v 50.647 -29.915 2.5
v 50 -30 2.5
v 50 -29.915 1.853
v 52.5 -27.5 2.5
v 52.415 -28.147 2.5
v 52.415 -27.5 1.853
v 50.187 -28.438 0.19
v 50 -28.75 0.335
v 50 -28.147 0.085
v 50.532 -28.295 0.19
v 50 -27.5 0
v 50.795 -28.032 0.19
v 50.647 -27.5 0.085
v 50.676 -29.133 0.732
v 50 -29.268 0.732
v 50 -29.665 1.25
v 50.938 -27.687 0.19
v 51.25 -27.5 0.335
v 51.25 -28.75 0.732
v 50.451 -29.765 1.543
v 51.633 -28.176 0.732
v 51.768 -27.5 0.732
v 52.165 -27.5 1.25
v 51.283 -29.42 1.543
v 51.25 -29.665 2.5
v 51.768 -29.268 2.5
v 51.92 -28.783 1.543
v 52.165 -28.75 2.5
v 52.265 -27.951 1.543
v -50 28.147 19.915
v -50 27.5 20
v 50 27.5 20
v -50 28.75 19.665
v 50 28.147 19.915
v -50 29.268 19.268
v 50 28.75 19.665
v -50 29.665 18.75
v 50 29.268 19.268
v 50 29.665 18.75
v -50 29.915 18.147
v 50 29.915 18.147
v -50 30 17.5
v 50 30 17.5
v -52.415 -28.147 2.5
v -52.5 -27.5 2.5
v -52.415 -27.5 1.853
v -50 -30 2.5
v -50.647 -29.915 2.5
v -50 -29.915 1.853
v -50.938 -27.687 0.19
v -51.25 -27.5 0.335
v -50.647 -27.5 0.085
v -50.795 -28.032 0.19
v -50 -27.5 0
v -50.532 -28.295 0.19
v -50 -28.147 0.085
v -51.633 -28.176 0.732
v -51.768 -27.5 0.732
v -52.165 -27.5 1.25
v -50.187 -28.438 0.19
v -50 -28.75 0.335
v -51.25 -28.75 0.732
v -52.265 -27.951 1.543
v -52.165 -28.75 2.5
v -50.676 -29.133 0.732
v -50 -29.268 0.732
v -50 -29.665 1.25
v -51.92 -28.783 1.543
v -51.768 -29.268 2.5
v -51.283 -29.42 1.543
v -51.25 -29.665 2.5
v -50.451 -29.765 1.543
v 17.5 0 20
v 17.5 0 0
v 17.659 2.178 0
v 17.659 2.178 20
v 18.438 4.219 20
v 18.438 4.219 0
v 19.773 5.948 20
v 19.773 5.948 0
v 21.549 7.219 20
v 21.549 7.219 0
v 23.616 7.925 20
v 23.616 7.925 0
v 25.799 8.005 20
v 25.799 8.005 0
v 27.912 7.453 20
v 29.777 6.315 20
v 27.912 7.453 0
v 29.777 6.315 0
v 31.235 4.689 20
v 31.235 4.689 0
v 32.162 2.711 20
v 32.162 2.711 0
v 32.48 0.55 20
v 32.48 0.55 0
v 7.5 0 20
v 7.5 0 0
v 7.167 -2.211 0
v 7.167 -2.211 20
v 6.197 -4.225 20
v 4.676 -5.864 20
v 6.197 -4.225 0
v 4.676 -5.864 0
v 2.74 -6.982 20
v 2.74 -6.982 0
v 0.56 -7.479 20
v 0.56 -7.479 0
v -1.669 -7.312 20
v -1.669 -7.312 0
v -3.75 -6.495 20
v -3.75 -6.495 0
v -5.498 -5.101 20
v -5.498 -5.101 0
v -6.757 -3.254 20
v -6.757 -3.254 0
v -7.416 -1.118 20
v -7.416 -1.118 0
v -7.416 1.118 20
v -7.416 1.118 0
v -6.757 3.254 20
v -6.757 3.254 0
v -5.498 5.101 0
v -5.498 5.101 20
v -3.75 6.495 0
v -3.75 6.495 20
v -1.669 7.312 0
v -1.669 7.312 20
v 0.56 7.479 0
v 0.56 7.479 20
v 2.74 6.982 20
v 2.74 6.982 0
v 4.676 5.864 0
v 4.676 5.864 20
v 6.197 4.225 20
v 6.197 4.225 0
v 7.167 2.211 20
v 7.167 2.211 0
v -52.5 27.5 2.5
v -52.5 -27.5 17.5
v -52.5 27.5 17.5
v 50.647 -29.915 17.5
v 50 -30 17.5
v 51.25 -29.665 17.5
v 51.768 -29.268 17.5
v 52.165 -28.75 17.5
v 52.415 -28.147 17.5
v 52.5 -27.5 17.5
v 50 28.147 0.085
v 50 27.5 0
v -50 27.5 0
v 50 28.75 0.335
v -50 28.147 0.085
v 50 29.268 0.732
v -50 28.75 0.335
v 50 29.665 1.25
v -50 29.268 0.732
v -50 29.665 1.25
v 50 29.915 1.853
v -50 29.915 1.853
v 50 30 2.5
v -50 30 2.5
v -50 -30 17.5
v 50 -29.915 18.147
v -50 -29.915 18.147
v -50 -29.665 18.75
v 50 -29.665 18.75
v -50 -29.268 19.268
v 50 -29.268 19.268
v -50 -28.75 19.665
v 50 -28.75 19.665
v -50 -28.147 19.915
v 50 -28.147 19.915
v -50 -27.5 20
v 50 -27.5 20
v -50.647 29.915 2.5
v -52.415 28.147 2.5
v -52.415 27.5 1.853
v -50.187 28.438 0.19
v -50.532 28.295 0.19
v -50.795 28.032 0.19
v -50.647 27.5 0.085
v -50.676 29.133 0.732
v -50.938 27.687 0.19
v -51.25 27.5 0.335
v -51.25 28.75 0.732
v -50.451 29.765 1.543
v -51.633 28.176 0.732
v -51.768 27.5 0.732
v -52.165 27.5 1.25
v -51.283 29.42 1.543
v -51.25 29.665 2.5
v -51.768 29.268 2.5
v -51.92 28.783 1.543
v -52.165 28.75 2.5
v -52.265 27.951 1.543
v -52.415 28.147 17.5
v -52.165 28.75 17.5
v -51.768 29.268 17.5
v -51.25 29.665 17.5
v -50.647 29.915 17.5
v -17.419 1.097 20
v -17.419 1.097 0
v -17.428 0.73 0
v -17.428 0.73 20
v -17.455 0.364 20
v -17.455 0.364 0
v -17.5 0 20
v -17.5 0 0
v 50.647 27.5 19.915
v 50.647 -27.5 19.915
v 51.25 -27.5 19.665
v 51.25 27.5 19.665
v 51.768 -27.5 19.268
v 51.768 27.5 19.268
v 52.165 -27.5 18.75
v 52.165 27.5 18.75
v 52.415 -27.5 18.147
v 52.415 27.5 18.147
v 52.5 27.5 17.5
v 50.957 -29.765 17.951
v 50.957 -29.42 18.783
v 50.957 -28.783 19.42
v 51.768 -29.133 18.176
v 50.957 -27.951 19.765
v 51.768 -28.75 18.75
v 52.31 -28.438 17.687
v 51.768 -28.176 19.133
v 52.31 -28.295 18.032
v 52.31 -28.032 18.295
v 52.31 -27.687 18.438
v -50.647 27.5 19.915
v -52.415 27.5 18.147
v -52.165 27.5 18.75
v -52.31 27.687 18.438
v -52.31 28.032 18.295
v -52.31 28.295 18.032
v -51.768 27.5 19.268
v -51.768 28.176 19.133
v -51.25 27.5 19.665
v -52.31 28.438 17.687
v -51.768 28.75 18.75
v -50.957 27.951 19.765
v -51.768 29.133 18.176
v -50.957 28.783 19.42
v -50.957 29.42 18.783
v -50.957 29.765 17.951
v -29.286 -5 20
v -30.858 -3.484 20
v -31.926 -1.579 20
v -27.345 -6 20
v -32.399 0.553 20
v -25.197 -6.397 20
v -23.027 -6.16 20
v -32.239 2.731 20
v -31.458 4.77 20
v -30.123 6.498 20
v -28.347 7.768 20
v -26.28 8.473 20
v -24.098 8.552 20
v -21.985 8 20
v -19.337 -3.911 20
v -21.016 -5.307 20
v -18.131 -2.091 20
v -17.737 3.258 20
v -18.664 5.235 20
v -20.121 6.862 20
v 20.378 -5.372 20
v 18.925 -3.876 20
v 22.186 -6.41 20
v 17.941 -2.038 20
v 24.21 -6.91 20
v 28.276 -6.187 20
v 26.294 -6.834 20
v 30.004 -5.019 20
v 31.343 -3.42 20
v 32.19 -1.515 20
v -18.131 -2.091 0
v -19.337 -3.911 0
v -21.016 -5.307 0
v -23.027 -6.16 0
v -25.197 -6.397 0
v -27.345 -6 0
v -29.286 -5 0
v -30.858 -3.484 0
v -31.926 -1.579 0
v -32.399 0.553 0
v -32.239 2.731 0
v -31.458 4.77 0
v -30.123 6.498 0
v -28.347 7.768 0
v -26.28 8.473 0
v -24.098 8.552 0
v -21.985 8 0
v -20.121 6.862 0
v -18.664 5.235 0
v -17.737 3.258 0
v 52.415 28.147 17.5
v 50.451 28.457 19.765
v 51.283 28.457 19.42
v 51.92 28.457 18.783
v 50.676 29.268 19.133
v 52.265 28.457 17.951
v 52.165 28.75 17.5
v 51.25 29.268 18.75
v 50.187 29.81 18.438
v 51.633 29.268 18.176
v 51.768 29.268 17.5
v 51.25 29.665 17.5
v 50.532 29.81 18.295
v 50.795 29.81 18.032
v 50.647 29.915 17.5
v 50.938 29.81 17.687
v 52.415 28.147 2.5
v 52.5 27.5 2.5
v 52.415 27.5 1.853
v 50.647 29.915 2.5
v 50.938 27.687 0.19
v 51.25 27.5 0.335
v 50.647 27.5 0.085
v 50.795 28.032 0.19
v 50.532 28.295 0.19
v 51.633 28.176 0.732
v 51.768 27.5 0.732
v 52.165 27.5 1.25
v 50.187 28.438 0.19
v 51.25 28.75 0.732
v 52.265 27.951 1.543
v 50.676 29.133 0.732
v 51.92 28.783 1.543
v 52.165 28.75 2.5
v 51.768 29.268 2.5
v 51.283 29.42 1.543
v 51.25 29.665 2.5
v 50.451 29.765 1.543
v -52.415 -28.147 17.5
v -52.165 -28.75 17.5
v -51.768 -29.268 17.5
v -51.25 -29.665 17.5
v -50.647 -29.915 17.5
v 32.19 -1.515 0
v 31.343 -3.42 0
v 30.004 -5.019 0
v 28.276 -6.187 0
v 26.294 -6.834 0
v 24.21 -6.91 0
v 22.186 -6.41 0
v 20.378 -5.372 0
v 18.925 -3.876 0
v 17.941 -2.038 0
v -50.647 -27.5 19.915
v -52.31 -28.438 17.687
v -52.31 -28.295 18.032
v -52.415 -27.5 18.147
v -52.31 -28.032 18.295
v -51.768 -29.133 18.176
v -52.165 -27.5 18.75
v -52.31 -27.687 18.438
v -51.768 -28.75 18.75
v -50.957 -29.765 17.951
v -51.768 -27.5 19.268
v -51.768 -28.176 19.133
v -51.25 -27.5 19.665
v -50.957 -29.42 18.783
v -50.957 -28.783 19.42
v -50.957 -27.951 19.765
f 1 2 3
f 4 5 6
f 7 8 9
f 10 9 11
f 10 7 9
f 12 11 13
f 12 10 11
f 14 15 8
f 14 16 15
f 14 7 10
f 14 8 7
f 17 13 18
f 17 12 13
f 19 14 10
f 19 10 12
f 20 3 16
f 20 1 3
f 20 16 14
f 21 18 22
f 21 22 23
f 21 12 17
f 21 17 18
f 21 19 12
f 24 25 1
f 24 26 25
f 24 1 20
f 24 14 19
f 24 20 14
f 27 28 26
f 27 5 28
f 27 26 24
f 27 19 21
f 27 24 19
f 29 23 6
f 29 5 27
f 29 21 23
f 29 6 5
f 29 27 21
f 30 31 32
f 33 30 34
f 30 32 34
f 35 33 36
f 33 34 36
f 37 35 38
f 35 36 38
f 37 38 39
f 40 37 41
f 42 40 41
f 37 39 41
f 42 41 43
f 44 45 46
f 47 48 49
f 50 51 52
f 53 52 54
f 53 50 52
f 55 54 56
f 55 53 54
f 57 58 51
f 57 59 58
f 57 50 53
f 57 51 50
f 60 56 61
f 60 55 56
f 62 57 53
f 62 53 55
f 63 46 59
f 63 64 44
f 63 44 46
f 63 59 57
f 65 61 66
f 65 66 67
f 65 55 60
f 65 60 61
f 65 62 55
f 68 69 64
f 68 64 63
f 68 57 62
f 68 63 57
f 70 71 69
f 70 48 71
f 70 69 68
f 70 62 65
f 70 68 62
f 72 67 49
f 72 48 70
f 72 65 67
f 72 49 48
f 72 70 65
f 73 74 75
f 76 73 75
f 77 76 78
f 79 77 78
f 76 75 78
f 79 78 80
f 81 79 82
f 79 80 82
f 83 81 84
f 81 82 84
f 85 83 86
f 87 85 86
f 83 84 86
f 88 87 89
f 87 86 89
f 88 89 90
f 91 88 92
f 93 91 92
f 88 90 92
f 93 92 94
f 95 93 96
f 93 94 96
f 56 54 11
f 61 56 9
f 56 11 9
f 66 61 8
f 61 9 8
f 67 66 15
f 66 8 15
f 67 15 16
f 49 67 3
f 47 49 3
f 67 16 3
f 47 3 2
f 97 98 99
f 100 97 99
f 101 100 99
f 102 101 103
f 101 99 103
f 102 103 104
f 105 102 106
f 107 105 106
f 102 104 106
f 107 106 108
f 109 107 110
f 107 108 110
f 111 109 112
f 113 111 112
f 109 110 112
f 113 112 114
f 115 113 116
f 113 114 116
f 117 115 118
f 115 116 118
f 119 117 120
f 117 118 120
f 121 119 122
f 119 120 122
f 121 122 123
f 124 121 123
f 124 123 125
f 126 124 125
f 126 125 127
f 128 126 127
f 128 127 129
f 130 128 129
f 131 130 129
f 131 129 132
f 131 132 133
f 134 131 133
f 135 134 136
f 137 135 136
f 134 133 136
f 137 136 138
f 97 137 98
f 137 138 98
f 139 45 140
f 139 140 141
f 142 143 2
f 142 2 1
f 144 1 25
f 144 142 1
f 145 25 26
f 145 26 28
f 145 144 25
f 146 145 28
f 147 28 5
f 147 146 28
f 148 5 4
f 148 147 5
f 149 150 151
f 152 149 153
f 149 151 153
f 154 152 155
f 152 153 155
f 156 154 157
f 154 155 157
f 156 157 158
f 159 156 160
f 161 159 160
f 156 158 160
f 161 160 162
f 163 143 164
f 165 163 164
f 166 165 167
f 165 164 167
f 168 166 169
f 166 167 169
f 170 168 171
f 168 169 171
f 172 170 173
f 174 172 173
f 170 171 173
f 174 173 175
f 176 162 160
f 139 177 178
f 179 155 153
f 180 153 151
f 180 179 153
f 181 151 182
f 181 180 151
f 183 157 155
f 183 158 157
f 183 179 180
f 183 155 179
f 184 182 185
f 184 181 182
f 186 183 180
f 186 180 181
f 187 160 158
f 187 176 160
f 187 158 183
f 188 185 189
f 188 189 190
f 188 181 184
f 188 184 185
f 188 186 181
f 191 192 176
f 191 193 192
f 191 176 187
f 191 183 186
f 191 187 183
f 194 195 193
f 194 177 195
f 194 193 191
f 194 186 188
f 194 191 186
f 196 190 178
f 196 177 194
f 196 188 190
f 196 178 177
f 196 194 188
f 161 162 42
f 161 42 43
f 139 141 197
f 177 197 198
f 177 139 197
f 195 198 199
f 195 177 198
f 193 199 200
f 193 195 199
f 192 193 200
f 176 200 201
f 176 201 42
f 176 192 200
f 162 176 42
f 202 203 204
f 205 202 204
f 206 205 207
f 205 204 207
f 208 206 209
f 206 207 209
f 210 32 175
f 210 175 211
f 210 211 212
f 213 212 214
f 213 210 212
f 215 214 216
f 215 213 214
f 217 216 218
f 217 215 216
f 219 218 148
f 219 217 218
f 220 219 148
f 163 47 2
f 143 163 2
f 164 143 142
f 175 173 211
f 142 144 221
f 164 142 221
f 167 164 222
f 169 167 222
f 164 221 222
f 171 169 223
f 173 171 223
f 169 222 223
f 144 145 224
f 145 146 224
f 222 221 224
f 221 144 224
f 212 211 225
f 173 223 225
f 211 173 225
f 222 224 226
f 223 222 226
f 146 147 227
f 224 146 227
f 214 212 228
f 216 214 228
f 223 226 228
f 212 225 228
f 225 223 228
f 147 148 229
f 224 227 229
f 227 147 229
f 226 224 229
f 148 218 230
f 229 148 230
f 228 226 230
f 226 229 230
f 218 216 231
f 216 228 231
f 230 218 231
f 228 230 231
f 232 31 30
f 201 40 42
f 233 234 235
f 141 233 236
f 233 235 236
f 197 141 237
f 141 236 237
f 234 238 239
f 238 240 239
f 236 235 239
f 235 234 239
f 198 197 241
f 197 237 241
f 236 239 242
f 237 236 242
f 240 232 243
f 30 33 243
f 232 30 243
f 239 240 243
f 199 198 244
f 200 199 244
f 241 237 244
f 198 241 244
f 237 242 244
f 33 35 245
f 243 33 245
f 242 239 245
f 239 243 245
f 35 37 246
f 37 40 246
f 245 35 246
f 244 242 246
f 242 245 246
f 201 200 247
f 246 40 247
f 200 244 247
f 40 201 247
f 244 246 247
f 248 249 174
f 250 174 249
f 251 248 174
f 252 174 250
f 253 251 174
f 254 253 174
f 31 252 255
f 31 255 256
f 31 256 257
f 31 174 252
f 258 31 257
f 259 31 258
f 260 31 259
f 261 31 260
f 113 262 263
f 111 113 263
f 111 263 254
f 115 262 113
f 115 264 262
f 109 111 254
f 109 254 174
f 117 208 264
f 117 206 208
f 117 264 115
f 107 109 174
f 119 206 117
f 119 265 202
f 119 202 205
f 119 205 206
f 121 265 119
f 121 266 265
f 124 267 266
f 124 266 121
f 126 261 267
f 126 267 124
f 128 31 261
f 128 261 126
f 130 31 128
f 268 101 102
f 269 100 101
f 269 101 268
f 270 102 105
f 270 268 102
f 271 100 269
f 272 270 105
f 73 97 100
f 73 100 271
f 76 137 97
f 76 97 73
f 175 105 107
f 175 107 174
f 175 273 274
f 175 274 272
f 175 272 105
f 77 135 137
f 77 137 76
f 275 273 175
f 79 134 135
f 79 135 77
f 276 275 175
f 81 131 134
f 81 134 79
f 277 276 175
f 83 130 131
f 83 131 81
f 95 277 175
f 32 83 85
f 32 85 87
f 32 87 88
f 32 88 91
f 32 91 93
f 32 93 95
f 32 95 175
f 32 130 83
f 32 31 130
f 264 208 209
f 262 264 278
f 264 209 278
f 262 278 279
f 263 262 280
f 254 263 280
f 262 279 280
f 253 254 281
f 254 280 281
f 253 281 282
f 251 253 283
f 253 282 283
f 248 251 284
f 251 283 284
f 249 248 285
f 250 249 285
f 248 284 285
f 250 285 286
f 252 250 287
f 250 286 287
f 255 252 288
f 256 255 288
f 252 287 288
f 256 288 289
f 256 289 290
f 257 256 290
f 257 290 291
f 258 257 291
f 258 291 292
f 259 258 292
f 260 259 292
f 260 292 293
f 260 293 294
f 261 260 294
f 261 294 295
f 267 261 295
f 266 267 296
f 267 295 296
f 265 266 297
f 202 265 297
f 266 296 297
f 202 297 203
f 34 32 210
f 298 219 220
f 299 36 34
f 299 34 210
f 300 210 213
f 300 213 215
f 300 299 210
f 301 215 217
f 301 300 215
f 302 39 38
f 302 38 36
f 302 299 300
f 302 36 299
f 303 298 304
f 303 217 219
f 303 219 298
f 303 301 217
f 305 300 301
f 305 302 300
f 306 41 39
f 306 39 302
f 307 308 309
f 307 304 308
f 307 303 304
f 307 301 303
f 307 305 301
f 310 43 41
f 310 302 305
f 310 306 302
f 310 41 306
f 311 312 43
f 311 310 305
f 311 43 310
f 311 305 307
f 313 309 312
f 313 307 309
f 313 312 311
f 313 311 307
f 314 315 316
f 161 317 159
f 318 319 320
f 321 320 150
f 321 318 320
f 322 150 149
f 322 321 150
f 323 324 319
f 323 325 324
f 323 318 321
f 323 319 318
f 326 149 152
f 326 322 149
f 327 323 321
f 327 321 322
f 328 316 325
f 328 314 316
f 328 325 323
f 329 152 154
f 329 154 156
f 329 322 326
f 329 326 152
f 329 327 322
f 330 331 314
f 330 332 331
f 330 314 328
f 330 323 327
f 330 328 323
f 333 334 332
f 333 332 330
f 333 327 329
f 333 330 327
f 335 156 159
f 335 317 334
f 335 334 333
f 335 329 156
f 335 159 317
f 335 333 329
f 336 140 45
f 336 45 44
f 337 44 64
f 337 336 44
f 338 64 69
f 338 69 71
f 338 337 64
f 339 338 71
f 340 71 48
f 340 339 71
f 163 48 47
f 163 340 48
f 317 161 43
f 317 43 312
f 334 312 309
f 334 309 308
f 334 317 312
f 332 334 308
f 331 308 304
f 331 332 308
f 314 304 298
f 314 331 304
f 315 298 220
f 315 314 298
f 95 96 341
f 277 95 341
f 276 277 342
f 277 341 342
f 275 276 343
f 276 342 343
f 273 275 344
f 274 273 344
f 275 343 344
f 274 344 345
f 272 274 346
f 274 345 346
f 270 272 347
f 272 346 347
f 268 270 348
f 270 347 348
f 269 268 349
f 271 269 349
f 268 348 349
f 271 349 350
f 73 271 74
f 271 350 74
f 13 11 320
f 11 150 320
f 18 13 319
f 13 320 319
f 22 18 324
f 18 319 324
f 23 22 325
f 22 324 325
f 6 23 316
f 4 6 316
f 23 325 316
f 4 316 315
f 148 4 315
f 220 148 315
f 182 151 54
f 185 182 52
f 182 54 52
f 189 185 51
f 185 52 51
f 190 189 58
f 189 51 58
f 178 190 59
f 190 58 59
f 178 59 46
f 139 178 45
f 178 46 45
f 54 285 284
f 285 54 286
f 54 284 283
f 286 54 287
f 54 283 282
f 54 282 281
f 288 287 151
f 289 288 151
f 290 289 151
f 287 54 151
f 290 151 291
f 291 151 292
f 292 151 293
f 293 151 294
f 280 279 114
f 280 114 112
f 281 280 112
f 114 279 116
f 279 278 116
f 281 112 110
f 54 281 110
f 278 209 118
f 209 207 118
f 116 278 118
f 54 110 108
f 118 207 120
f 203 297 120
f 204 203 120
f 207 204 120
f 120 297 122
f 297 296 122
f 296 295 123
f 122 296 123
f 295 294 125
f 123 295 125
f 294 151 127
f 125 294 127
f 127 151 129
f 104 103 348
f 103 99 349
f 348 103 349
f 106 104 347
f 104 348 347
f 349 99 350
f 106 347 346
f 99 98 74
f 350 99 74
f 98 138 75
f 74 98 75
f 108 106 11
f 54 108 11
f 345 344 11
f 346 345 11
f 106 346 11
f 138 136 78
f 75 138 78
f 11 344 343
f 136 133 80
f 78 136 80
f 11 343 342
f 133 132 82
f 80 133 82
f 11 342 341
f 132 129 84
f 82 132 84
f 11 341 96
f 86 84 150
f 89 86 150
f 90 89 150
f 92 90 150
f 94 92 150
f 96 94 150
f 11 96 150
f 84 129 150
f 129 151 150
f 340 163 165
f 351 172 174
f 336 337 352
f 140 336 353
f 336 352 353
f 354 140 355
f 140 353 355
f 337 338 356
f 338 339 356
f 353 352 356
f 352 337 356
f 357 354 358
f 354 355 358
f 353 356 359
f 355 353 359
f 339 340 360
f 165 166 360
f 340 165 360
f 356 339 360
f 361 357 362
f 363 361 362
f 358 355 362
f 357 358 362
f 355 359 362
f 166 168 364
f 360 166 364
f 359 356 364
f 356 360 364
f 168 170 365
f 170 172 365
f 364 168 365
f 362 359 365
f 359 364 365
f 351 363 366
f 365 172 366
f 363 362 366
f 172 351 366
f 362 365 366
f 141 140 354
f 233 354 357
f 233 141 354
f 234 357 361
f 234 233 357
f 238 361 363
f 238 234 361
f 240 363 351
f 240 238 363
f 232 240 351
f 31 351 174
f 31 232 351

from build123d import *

# Parameters (mm, degrees)
F0_W        = 105
F0_H        = 60
F1_DEPTH    = 20
F2_R        = 2.5
F3_R        = 2.5
F4_R        = 2.5
F5_T1_DEPTH = 23.75
F5_S5_W     = 2.5
F5_S5_H     = 2.5
F5_T6_DEPTH = 2.5
F6_R        = 2.5


# Not quite as in the source:
# - a fillet or chamfer that OpenCascade refuses, or shapes differently, is made with other operations: its cross-section is extruded or revolved along the edge and cut away or added


with BuildPart() as f1:
    # F0 (on Top) → F1 (new body)
    with BuildSketch(Plane.XY):
        Rectangle(F0_W, F0_H)
        with BuildLine():
            ThreePointArc((-17.4192723763, 1.0974504119), (-17.4394815095, 0.547242643), (-17.5, 0))
            ThreePointArc((-17.5, 0), (-32.3990632431, 1.6476581808), (-17.4192723763, 1.0974504119))
        make_face(mode=Mode.SUBTRACT)
        with BuildLine():
            ThreePointArc((-7.5, 0), (0, 7.5), (7.5, 0))
            ThreePointArc((7.5, 0), (0, -7.5), (-7.5, 0))
        make_face(mode=Mode.SUBTRACT)
        with BuildLine():
            ThreePointArc((32.4798090562, 0.5499604379), (25.2549745325, -6.9449901264), (17.5, 0))
            ThreePointArc((17.5, 0), (24.7046435799, 8.0449110021), (32.4798090562, 0.5499604379))
        make_face(mode=Mode.SUBTRACT)
    extrude(amount=F1_DEPTH)

    # F2
    f2_edges = [f1.edges().sort_by_distance(p)[0] for p in [
        (0, -30, 20),
    ]]
    fillet(f2_edges, radius=F2_R)

    # F3
    f3_edges = [f1.edges().sort_by_distance(p)[0] for p in [
        (52.5, 1.25, 20),
        (0, 30, 20),
    ]]
    fillet(f3_edges, radius=F3_R)

    # F4
    f4_edges = [f1.edges().sort_by_distance(p)[0] for p in [
        (-52.5, 0, 20),
    ]]
    fillet(f4_edges, radius=F4_R)

    # F5: fillet of radius 2.5 on 1 edges, made by hand

    # F5_s2 → F5_t1 (cut)
    with BuildSketch(Plane.XY.offset(-6.25)):
        with BuildLine():
            ThreePointArc((50, 30), (51.767766953, 29.267766953), (52.5, 27.5))
            Line((52.5, 27.5), (52.5, 30))
            Line((52.5, 30), (50, 30))
        make_face()
    extrude(amount=F5_T1_DEPTH, mode=Mode.SUBTRACT)


with BuildPart() as f5_tool4:
    # F5_s5 → F5_t6 (new body)
    with BuildSketch(Plane.XZ.offset(-27.5)):
        with Locations((51.25, 18.75)):
            Rectangle(F5_S5_W, F5_S5_H)
    extrude(amount=-F5_T6_DEPTH)

    # F5_s7 → F5_t8 (revolve, cut)
    with BuildSketch(Plane(origin=(50, 27.5, 17.5), x_dir=(-0.7071067812, 0, -0.7071067812), z_dir=(0.7071067812, 0, -0.7071067812))):
        with BuildLine():
            ThreePointArc((0, -2.5), (2.5, 0), (0, 2.5))
            Line((0, 2.5), (0, -2.5))
        make_face()
    revolve(axis=Axis((50, 27.5, 17.5), (0, 1, 0)), mode=Mode.SUBTRACT)


with BuildPart() as f1_1:
    add(f1.part)

    # F5_t3: cut F5_tool4
    add(f5_tool4.part, mode=Mode.SUBTRACT)

    # F6
    f6_edges = [f1_1.edges().sort_by_distance(p)[0] for p in [
        (52.5, 0, 0),
    ]]
    fillet(f6_edges, radius=F6_R)


solid = f1_1.part
